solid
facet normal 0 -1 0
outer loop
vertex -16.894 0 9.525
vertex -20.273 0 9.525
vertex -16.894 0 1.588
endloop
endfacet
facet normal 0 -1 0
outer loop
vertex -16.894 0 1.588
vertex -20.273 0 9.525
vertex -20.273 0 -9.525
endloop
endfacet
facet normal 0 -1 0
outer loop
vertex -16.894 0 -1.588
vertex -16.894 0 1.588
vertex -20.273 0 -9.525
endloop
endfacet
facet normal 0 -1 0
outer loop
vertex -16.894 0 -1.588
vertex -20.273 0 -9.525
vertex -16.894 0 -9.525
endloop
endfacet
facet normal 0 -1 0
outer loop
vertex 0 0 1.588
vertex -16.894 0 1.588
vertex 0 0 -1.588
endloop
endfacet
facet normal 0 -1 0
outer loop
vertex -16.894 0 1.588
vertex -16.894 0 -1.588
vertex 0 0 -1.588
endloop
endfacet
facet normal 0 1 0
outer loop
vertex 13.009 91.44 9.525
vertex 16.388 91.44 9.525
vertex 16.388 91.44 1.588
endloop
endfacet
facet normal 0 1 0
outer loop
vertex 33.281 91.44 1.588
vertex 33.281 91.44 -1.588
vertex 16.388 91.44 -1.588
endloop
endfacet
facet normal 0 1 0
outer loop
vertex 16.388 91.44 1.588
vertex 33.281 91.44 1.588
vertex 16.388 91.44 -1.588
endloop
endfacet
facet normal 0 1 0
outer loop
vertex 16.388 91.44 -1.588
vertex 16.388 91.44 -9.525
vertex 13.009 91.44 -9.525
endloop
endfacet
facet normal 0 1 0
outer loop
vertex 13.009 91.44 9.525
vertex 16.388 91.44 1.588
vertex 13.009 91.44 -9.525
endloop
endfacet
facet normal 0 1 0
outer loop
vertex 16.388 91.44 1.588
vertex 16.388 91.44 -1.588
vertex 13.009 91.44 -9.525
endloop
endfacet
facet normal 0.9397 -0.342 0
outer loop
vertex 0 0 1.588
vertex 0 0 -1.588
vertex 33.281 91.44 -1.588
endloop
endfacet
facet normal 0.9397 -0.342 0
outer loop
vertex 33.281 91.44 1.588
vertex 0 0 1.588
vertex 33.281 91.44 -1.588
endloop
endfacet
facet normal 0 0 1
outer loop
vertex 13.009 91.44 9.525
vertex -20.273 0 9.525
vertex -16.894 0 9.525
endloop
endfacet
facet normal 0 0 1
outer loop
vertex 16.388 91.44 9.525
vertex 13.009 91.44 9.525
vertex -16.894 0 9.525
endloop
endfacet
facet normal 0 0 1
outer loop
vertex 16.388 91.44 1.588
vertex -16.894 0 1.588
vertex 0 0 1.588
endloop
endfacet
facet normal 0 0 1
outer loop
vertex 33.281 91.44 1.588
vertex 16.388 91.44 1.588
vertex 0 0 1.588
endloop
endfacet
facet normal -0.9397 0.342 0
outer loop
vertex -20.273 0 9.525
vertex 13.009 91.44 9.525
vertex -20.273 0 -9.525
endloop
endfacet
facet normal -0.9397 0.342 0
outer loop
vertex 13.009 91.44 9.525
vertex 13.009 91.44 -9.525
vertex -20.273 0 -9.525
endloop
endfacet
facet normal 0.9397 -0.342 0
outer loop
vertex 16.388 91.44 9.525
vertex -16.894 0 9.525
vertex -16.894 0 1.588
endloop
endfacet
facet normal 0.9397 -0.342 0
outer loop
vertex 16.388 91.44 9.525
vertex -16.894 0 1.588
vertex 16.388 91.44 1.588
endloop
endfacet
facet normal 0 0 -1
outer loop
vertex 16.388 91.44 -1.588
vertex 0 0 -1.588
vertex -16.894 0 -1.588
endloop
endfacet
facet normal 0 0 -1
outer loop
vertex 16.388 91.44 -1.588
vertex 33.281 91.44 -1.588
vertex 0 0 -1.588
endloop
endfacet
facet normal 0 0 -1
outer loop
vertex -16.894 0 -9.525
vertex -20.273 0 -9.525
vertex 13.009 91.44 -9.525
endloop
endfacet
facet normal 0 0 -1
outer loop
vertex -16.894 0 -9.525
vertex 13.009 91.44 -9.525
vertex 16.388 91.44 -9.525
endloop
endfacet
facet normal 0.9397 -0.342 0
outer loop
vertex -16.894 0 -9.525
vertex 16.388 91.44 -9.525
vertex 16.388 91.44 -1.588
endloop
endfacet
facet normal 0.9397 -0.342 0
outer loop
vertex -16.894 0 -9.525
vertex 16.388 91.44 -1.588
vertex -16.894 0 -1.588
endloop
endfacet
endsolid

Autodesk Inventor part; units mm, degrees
ref_plane "YZ Plane" through (0, 0, 0) normal (1, 0, 0) x (0, 1, 0)
ref_plane "XZ Plane" through (0, 0, 0) normal (0, 1, 0) x (-1, 0, 0)
ref_plane "XY Plane" through (0, 0, 0) normal (0, 0, 1) x (1, 0, 0)
sketch "Sketch1" plane through (0, 0, 0) normal (0, 0, 1) x (1, 0, 0)
  line L0 (-30.9834, 0) -> (43.9922, 0) projected
  line L1 (0, -18.288) -> (0, 109.728) projected
  line L2 (0, 0) -> (33.2814, 91.44)
  line L3 (33.2814, 91.44) -> (13.0089, 91.44)
  line L4 (13.0089, 91.44) -> (-20.2726, 0)
  dimension "d0" = 19.05
  dimension "d10" = 20
  dimension "d11" = 91.44
extrude "Extrusion1" add sketch "Sketch1" along normal mid plane 19.05
sketch "Sketch3" plane through (0, 0, 9.525) normal (0, 0, 1) x (1, 0, 0)
  line L0 (-20.2726, 0) -> (13.0089, 91.44) projected
  line L1 (0, 0) -> (-20.2726, 0) projected
  line L2 (33.2814, 91.44) -> (0, 0) projected
  line L3 (13.0089, 91.44) -> (33.2814, 91.44) projected
  line L4 (-16.8938, 0) -> (16.3876, 91.44)
  dimension "d7" = 3.175
extrude "Extrusion2" cut sketch "Sketch3" against normal blind 7.9375 contours L4 L3 L2 L1
mirror "Mirror1" about plane through (0, 0, 0) normal (0, 0, 1) of "Extrusion2"
properties part number "brace"
